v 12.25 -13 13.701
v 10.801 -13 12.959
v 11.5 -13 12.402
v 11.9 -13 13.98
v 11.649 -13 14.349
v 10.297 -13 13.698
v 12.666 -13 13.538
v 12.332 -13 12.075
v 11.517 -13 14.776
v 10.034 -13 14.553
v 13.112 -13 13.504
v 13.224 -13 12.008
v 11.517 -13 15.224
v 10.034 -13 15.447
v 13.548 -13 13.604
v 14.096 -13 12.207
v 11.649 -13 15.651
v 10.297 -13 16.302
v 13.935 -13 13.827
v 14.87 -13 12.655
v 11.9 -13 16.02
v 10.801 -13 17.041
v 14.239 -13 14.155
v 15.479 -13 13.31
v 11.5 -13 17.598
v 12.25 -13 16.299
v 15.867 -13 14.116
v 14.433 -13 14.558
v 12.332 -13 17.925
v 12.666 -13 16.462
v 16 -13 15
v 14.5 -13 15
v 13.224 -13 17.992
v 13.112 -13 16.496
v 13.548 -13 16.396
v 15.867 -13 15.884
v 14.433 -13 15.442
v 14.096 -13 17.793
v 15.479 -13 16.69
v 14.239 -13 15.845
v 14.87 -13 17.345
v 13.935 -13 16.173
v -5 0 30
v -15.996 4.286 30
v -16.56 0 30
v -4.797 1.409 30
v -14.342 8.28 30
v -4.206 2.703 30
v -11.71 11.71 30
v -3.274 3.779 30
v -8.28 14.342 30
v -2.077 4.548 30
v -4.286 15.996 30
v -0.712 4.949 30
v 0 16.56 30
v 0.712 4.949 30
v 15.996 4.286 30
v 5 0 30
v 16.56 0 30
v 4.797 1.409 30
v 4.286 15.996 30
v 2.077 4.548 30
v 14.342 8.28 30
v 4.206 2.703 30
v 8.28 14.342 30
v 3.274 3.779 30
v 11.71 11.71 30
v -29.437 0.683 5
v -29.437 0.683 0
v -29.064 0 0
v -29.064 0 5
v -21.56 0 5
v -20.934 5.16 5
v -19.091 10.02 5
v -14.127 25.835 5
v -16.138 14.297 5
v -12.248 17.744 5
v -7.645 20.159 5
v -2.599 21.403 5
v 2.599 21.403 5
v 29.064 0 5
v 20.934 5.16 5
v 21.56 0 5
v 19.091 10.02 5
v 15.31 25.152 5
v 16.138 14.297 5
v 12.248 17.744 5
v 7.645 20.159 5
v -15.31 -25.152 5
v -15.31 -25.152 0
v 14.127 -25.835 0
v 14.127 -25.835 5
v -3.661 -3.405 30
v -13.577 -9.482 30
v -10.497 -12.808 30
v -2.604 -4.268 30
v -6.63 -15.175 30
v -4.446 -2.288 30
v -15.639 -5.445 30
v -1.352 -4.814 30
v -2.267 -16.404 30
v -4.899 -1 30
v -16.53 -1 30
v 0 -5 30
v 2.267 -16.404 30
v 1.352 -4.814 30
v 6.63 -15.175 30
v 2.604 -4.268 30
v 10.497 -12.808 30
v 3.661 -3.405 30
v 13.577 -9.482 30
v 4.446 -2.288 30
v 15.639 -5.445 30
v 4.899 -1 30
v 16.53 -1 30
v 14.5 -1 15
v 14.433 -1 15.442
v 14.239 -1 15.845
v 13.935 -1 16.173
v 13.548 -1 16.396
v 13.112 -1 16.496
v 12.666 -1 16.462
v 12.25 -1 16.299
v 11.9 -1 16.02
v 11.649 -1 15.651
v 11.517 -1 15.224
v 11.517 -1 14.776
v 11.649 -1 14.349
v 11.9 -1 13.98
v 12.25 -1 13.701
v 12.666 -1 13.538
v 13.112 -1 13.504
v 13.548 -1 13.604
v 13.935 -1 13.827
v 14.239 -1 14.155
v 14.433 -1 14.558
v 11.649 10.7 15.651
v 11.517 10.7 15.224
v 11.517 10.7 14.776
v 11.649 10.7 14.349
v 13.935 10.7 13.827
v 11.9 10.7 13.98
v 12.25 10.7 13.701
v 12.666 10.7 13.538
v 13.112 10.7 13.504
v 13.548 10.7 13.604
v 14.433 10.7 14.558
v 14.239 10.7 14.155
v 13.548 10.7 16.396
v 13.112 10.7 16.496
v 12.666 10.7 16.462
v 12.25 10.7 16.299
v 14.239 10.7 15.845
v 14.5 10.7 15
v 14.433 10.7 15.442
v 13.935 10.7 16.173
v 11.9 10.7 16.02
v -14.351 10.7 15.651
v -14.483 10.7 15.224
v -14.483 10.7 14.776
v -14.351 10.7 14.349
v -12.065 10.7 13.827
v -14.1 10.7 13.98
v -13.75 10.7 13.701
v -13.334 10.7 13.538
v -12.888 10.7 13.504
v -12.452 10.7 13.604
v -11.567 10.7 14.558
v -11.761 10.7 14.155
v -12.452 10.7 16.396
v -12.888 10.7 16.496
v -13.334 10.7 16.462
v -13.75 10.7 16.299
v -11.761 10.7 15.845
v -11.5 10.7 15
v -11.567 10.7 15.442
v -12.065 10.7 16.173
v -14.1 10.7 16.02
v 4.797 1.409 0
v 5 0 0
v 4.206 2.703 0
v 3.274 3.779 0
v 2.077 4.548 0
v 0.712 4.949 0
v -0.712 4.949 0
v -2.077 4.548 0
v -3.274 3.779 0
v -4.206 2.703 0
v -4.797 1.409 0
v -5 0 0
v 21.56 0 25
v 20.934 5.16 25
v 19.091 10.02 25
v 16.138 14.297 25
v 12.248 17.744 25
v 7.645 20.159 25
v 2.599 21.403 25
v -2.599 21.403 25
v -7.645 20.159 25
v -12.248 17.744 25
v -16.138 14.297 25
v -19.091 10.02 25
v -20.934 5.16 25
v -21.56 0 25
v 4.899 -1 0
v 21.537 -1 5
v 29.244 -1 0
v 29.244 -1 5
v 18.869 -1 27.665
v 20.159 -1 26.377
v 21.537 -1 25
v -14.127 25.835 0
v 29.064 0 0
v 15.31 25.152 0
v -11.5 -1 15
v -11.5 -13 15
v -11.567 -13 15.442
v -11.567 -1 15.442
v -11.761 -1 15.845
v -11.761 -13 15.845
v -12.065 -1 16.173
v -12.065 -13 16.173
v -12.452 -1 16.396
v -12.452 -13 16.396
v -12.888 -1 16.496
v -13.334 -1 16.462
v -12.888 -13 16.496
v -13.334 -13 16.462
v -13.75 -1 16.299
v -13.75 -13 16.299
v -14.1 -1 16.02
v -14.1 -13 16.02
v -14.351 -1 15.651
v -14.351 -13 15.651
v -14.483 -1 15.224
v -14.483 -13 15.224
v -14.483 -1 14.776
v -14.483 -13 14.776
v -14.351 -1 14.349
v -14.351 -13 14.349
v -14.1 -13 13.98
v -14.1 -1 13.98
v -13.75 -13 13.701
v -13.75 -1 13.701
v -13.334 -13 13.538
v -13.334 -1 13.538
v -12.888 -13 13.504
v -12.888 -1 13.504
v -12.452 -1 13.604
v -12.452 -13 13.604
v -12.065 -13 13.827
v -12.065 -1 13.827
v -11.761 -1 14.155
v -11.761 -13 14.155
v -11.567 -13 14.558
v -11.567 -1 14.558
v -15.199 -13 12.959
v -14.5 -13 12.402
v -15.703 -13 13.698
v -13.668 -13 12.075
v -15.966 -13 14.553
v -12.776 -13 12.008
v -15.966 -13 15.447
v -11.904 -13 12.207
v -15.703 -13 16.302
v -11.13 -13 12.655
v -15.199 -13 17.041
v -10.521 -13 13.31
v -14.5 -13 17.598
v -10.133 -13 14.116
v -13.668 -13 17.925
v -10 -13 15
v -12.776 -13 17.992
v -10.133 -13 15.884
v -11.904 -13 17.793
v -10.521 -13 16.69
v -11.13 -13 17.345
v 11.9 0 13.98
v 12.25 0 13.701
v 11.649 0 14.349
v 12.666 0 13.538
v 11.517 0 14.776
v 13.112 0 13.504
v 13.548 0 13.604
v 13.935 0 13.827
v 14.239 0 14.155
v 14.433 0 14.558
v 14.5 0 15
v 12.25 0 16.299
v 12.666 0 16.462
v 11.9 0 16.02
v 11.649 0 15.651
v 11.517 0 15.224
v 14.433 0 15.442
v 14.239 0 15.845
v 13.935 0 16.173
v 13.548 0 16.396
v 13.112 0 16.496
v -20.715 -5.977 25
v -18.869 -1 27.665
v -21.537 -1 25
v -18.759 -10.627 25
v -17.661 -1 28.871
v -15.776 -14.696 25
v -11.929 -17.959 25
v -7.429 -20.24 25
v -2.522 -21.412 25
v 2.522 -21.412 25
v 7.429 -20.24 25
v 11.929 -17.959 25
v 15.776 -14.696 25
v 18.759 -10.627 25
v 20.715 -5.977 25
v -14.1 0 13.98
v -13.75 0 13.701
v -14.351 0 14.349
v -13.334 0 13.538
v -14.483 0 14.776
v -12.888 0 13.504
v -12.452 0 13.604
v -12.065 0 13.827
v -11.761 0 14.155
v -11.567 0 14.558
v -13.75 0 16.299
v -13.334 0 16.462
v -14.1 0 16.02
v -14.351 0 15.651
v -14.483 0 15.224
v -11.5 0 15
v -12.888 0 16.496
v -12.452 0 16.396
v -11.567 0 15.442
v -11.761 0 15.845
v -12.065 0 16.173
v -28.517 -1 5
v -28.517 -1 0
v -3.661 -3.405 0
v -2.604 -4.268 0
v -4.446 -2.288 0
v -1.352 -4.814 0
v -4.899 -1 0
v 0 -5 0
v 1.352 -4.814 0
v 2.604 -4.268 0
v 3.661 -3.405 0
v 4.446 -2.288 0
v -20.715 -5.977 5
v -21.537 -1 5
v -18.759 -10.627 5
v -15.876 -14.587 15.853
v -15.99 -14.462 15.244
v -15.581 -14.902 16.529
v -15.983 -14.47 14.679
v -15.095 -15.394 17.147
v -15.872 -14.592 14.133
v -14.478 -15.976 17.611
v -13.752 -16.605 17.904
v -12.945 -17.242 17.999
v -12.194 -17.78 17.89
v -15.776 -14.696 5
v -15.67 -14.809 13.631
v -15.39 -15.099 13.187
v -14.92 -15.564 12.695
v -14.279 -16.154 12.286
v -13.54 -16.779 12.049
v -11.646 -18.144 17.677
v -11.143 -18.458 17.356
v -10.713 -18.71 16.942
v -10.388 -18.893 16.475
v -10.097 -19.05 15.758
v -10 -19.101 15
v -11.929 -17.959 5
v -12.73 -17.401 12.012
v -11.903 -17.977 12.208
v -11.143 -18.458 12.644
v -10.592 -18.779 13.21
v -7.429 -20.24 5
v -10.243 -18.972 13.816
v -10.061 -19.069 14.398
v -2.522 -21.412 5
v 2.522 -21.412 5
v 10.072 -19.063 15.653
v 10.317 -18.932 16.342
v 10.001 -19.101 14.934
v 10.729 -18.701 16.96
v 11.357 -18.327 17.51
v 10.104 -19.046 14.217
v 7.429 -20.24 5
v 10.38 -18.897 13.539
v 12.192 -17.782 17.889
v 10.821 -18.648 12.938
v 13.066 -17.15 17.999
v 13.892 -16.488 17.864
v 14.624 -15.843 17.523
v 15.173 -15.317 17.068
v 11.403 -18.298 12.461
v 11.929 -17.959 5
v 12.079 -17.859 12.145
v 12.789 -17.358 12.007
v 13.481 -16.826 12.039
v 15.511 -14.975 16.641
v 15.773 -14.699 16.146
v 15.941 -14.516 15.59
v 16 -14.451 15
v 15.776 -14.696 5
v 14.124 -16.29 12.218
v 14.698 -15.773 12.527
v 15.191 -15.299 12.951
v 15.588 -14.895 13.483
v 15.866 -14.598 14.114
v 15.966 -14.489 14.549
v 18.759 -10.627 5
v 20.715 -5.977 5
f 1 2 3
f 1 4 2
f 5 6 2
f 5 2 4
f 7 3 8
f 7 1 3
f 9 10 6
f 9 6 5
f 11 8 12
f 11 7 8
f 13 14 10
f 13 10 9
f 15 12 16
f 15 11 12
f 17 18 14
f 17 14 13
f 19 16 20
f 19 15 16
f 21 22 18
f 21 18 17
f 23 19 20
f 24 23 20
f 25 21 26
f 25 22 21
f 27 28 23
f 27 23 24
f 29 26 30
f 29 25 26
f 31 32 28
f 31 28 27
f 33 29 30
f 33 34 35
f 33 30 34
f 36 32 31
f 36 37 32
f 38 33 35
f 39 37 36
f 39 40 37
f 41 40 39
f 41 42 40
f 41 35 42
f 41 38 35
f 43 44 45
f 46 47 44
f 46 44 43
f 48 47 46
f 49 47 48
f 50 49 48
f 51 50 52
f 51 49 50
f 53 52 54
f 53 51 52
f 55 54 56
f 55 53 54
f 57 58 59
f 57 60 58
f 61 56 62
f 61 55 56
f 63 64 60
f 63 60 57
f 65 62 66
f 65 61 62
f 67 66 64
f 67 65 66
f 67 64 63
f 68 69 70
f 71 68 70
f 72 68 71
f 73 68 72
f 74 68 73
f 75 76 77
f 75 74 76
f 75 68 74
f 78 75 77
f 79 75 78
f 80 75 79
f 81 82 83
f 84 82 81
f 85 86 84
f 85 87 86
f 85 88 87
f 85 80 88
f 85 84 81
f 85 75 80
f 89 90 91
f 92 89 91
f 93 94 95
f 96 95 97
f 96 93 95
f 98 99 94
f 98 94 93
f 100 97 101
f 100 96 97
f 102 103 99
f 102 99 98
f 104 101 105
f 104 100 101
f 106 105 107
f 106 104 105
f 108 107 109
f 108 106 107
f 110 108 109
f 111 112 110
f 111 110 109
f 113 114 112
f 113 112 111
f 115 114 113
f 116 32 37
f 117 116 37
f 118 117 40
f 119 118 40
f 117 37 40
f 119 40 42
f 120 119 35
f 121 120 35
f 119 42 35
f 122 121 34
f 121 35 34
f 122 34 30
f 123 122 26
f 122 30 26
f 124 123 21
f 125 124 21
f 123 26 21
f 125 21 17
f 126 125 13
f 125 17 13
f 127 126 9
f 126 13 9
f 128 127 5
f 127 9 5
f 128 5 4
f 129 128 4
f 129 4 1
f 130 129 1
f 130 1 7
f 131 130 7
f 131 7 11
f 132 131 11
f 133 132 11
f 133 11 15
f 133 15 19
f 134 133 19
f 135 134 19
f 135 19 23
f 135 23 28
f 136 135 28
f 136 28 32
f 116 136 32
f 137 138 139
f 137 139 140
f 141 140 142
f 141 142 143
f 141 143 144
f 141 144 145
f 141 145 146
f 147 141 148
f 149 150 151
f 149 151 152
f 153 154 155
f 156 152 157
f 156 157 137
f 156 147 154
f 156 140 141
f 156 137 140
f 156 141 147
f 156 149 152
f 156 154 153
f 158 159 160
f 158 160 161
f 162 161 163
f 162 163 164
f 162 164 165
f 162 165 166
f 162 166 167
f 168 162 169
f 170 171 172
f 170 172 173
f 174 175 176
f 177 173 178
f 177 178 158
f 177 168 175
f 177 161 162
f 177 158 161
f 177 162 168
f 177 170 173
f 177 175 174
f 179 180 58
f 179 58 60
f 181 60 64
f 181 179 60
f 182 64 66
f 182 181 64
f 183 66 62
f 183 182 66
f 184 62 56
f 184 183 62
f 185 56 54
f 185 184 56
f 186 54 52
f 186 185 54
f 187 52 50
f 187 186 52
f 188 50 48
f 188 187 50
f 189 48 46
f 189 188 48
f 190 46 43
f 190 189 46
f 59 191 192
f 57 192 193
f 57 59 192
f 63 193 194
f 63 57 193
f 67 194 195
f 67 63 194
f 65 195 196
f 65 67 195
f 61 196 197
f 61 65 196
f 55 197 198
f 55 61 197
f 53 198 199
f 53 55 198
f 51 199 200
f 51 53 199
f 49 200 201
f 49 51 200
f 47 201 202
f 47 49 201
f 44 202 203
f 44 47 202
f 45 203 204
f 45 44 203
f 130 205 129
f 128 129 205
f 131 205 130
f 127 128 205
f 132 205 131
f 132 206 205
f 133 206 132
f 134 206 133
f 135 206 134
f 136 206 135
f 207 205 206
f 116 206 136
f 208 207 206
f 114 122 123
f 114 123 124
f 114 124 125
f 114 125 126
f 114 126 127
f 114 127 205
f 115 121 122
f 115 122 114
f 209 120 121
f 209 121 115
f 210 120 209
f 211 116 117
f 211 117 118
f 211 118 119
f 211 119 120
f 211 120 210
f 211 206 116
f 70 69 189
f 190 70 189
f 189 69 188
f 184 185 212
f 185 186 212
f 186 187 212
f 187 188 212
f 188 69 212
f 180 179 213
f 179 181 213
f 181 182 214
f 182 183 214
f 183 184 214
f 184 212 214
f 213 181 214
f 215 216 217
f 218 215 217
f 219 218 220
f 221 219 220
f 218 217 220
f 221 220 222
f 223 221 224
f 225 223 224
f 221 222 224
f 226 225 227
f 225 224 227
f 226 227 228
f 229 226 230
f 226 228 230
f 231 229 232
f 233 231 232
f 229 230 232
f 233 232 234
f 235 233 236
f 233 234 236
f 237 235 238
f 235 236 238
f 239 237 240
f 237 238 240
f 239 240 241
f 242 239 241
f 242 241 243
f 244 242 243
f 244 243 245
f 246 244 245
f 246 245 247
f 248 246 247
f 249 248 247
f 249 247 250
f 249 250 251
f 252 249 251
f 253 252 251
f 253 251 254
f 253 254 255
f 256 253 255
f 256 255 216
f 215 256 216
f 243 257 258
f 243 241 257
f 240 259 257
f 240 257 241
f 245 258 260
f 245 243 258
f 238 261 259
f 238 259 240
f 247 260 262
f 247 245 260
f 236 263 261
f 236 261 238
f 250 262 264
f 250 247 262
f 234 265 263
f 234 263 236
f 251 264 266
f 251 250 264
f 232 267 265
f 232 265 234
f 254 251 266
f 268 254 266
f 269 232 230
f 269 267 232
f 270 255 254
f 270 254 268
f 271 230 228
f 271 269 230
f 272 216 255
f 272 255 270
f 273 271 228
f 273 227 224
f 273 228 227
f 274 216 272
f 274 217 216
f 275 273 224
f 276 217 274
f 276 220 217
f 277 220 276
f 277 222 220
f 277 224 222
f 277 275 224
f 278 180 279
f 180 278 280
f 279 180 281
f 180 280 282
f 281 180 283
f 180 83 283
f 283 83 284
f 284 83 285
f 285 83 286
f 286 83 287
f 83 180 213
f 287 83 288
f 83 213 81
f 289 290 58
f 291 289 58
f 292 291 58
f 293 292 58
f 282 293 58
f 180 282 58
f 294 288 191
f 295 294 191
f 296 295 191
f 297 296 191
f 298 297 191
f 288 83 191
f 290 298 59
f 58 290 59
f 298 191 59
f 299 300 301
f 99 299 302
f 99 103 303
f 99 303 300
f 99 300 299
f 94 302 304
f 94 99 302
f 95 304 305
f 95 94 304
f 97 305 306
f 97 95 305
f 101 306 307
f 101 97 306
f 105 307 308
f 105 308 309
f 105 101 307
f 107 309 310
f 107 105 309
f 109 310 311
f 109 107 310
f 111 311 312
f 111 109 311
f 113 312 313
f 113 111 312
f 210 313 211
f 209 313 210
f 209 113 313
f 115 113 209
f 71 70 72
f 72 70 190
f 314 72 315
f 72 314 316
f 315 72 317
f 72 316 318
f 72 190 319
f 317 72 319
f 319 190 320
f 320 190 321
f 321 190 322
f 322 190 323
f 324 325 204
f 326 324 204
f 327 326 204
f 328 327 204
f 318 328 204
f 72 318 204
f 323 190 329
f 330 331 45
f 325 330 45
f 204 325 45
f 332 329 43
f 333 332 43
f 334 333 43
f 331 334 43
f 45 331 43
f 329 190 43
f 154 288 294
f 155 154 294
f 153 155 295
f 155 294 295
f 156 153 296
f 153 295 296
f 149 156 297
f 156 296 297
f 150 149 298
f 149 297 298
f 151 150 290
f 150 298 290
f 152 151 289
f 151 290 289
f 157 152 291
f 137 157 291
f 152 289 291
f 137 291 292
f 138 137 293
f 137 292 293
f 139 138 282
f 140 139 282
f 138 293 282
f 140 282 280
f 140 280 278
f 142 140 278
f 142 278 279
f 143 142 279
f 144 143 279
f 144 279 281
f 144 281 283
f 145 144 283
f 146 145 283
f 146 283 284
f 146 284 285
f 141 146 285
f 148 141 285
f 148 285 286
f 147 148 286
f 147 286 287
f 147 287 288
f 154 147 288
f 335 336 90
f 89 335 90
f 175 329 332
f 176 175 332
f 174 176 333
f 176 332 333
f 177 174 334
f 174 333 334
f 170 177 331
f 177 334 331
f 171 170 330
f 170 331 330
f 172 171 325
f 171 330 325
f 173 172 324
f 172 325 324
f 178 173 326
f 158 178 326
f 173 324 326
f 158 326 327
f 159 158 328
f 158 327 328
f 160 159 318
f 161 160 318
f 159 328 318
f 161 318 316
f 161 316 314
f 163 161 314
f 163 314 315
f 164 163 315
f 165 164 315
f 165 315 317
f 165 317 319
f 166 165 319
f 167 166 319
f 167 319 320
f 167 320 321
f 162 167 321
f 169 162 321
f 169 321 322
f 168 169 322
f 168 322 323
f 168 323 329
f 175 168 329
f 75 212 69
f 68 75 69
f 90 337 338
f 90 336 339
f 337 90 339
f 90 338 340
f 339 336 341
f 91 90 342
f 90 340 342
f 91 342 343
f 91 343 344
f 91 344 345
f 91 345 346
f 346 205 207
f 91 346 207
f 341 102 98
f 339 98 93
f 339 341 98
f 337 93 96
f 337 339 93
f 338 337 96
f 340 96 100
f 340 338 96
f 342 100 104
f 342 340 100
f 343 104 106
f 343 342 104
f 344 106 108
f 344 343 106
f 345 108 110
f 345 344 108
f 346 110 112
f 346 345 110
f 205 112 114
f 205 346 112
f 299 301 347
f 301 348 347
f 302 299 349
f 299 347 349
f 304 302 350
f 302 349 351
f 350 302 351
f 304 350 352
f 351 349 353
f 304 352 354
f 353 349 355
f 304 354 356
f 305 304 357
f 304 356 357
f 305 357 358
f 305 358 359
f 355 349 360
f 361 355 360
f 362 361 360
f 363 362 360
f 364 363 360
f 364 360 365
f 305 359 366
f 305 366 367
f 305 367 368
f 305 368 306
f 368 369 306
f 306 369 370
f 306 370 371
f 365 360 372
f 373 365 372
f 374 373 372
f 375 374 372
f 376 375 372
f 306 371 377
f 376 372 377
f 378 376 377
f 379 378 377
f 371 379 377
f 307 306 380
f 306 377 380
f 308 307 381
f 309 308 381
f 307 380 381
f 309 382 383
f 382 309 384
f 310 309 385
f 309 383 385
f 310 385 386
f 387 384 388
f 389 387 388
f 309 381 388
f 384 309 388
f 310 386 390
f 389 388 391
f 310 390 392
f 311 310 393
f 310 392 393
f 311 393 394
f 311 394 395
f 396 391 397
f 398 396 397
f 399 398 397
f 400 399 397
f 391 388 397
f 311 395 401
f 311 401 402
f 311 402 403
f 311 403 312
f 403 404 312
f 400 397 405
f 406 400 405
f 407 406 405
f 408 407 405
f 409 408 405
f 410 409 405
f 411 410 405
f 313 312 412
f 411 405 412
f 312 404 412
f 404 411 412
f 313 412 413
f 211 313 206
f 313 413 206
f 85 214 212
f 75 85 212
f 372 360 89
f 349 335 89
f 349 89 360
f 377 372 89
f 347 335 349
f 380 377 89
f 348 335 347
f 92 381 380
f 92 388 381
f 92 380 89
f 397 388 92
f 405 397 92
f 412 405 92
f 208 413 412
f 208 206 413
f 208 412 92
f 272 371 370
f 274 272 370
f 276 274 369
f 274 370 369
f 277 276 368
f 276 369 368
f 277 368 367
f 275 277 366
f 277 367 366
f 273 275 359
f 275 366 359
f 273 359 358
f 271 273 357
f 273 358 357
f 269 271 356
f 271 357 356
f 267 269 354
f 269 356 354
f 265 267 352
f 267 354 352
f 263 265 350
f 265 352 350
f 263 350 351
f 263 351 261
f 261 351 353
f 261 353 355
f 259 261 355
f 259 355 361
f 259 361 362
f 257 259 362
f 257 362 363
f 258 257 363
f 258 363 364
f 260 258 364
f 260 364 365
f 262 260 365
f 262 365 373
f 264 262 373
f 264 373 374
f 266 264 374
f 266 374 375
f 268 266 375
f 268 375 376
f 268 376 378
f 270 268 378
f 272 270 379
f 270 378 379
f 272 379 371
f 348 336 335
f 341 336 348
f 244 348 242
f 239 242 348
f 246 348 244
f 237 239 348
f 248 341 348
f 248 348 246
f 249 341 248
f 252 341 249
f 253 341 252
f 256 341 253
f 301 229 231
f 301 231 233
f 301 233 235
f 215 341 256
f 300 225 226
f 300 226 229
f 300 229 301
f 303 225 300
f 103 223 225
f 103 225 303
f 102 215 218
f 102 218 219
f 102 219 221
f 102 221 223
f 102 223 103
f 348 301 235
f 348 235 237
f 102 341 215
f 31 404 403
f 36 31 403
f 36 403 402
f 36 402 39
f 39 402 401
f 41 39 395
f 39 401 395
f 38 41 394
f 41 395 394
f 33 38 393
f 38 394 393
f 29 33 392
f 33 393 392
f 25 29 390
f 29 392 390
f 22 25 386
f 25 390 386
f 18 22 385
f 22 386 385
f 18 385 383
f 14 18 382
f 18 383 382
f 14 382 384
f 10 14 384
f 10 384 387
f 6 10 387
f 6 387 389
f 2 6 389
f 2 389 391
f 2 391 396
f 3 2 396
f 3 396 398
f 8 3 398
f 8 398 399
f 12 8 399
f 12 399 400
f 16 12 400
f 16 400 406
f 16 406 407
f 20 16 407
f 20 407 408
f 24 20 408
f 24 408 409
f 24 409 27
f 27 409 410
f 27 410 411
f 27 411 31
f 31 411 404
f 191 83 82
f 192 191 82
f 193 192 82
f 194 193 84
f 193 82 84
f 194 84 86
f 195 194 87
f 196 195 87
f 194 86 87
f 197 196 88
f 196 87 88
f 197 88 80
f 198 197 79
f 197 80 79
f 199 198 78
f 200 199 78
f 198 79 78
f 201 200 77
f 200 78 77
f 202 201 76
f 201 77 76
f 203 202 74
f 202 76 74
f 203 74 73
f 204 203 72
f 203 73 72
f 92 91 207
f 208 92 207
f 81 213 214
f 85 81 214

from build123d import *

# Parameters (mm, degrees)
F0_R      = 5
F1_DEPTH  = 5
F2_R      = 21.5602394688
F3_DEPTH  = 25
F4_SIZE   = 5
F5_DEPTH  = 25.001
F7_R      = 3
F7_R_2    = 1.5
F8_DEPTH  = 7
F9_DEPTH  = 30.7
F10_W     = 1
F10_H     = 40
F11_DEPTH = 50


with BuildPart() as f1:
    # F0 (on Top) → F1 (new body)
    with BuildSketch(Plane.XY):
        Polygon((-14.1271800967, 25.8345269458), (-29.4369466782, 0.6827666253), (-15.3097665815, -25.1517603205), (14.1271800967, -25.8345269458), (29.4369466782, -0.6827666253), (15.3097665815, 25.1517603205), align=None)
        Circle(F0_R, mode=Mode.SUBTRACT)
    extrude(amount=F1_DEPTH)

    # F2 (on face) → F3 (join)
    with BuildSketch(Plane.XY.offset(5)):
        Circle(F2_R)
    extrude(amount=F3_DEPTH)

    # F4
    f4_edges = [f1.edges().sort_by_distance(p)[0] for p in [
        (-21.560239, 0, 30),
    ]]
    chamfer(f4_edges, length=F4_SIZE)

    # F5 (cut, through all): a face of the model
    f5_faces = [f1.faces().sort_by_distance(p)[0] for p in [
        (0, 0, 5),
    ]]
    extrude(f5_faces, amount=-F5_DEPTH, mode=Mode.SUBTRACT)

    # F7 (on offset) → F8 (cut)
    with BuildSketch(Plane.XZ.offset(20)):
        with Locations((13, 15)):
            Circle(F7_R)
        with Locations((13, 15)):
            Circle(F7_R_2, mode=Mode.SUBTRACT)
        with Locations((-13, 15)):
            Circle(F7_R)
        with Locations((-13, 15)):
            Circle(F7_R_2, mode=Mode.SUBTRACT)
        with Locations((13, 15)):
            Circle(F7_R_2)
        with Locations((-13, 15)):
            Circle(F7_R_2)
    extrude(amount=-F8_DEPTH, mode=Mode.SUBTRACT)

    # F7 (on offset) → F9 (cut)
    with BuildSketch(Plane.XZ.offset(20)):
        with Locations((-13, 15)):
            Circle(F7_R_2)
        with Locations((13, 15)):
            Circle(F7_R_2)
    extrude(amount=-F9_DEPTH, mode=Mode.SUBTRACT)

    # F10 (on Right) → F11 (cut, symmetric)
    with BuildSketch(Plane.YZ):
        with Locations((-0.5, 17.8666667133)):
            Rectangle(F10_W, F10_H)
    extrude(amount=F11_DEPTH, both=True, mode=Mode.SUBTRACT)


solid = f1.part
